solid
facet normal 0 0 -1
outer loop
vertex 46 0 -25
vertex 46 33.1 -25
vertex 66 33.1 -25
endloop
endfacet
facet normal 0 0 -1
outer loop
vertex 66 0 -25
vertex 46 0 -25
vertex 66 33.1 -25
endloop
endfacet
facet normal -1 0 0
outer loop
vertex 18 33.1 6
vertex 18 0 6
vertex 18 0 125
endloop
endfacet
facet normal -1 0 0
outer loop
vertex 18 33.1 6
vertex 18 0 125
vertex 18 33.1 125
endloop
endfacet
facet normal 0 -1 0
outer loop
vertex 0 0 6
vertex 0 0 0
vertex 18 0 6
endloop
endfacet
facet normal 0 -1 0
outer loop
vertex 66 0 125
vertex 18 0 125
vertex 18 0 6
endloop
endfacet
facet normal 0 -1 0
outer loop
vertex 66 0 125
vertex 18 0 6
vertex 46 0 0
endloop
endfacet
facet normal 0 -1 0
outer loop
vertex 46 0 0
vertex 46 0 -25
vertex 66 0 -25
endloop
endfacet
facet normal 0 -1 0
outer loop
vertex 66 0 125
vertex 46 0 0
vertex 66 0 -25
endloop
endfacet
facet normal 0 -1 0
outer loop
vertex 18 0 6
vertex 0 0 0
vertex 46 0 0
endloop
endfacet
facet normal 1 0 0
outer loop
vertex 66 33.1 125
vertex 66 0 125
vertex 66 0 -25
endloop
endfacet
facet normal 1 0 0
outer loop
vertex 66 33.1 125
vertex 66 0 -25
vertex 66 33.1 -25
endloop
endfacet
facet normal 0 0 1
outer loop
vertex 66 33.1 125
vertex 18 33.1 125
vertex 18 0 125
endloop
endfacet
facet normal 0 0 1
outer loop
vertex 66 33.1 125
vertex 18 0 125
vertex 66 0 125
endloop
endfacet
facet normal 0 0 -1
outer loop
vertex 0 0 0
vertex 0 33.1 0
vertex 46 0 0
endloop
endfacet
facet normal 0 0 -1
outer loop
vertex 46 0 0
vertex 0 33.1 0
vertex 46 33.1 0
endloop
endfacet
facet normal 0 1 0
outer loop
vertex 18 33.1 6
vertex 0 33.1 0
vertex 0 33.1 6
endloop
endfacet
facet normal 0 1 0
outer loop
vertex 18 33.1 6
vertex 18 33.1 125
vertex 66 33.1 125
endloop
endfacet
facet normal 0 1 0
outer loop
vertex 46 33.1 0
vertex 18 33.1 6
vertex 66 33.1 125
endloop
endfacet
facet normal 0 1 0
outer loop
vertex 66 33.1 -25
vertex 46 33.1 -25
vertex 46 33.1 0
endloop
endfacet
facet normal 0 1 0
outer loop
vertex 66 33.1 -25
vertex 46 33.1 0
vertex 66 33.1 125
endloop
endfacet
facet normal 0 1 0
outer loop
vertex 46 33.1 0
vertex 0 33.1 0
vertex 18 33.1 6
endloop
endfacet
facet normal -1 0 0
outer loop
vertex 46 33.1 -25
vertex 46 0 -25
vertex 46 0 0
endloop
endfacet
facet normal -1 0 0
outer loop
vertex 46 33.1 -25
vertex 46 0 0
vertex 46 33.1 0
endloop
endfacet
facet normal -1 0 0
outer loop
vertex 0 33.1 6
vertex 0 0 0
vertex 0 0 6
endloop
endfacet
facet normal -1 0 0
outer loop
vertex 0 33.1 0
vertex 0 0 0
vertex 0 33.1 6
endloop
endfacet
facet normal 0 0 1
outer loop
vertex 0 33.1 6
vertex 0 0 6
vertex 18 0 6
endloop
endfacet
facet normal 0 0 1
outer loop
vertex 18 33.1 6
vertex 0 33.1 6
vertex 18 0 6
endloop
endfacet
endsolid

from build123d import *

# Parameters (mm, degrees)
BOX002_W     = 48
BOX002_H     = 33.1
BOX002_DEPTH = 125
BOX001_W     = 11
BOX001_H     = 33.1
BOX001_DEPTH = 31
BOX_W        = 66
BOX_H        = 33.1
BOX_DEPTH    = 6
BOX003_W     = 10
BOX003_H     = 33.1
BOX003_DEPTH = 31


with BuildPart() as cubo002:
    # Box002 → Box002 (new body)
    with BuildSketch(Plane(origin=(18, 0, 0), x_dir=(1, 0, 0), z_dir=(0, 0, 1))):
        with Locations((24, 16.55)):
            Rectangle(BOX002_W, BOX002_H)
    extrude(amount=BOX002_DEPTH)


with BuildPart() as cubo001:
    # Box001 → Box001 (new body)
    with BuildSketch(Plane(origin=(46, 0, -25), x_dir=(1, 0, 0), z_dir=(0, 0, 1))):
        with Locations((5.5, 16.55)):
            Rectangle(BOX001_W, BOX001_H)
    extrude(amount=BOX001_DEPTH)


with BuildPart() as cubo:
    # Box → Box (new body)
    with BuildSketch(Plane.XY):
        with Locations((33, 16.55)):
            Rectangle(BOX_W, BOX_H)
    extrude(amount=BOX_DEPTH)


with BuildPart() as fusion:
    # Box003 → Box003 (new body)
    with BuildSketch(Plane(origin=(56, 0, -25), x_dir=(1, 0, 0), z_dir=(0, 0, 1))):
        with Locations((5, 16.55)):
            Rectangle(BOX003_W, BOX003_H)
    extrude(amount=BOX003_DEPTH)

    # Fusion: union Cubo002, Cubo001, Cubo
    add(cubo002.part)
    add(cubo001.part)
    add(cubo.part)


solid = fusion.part
